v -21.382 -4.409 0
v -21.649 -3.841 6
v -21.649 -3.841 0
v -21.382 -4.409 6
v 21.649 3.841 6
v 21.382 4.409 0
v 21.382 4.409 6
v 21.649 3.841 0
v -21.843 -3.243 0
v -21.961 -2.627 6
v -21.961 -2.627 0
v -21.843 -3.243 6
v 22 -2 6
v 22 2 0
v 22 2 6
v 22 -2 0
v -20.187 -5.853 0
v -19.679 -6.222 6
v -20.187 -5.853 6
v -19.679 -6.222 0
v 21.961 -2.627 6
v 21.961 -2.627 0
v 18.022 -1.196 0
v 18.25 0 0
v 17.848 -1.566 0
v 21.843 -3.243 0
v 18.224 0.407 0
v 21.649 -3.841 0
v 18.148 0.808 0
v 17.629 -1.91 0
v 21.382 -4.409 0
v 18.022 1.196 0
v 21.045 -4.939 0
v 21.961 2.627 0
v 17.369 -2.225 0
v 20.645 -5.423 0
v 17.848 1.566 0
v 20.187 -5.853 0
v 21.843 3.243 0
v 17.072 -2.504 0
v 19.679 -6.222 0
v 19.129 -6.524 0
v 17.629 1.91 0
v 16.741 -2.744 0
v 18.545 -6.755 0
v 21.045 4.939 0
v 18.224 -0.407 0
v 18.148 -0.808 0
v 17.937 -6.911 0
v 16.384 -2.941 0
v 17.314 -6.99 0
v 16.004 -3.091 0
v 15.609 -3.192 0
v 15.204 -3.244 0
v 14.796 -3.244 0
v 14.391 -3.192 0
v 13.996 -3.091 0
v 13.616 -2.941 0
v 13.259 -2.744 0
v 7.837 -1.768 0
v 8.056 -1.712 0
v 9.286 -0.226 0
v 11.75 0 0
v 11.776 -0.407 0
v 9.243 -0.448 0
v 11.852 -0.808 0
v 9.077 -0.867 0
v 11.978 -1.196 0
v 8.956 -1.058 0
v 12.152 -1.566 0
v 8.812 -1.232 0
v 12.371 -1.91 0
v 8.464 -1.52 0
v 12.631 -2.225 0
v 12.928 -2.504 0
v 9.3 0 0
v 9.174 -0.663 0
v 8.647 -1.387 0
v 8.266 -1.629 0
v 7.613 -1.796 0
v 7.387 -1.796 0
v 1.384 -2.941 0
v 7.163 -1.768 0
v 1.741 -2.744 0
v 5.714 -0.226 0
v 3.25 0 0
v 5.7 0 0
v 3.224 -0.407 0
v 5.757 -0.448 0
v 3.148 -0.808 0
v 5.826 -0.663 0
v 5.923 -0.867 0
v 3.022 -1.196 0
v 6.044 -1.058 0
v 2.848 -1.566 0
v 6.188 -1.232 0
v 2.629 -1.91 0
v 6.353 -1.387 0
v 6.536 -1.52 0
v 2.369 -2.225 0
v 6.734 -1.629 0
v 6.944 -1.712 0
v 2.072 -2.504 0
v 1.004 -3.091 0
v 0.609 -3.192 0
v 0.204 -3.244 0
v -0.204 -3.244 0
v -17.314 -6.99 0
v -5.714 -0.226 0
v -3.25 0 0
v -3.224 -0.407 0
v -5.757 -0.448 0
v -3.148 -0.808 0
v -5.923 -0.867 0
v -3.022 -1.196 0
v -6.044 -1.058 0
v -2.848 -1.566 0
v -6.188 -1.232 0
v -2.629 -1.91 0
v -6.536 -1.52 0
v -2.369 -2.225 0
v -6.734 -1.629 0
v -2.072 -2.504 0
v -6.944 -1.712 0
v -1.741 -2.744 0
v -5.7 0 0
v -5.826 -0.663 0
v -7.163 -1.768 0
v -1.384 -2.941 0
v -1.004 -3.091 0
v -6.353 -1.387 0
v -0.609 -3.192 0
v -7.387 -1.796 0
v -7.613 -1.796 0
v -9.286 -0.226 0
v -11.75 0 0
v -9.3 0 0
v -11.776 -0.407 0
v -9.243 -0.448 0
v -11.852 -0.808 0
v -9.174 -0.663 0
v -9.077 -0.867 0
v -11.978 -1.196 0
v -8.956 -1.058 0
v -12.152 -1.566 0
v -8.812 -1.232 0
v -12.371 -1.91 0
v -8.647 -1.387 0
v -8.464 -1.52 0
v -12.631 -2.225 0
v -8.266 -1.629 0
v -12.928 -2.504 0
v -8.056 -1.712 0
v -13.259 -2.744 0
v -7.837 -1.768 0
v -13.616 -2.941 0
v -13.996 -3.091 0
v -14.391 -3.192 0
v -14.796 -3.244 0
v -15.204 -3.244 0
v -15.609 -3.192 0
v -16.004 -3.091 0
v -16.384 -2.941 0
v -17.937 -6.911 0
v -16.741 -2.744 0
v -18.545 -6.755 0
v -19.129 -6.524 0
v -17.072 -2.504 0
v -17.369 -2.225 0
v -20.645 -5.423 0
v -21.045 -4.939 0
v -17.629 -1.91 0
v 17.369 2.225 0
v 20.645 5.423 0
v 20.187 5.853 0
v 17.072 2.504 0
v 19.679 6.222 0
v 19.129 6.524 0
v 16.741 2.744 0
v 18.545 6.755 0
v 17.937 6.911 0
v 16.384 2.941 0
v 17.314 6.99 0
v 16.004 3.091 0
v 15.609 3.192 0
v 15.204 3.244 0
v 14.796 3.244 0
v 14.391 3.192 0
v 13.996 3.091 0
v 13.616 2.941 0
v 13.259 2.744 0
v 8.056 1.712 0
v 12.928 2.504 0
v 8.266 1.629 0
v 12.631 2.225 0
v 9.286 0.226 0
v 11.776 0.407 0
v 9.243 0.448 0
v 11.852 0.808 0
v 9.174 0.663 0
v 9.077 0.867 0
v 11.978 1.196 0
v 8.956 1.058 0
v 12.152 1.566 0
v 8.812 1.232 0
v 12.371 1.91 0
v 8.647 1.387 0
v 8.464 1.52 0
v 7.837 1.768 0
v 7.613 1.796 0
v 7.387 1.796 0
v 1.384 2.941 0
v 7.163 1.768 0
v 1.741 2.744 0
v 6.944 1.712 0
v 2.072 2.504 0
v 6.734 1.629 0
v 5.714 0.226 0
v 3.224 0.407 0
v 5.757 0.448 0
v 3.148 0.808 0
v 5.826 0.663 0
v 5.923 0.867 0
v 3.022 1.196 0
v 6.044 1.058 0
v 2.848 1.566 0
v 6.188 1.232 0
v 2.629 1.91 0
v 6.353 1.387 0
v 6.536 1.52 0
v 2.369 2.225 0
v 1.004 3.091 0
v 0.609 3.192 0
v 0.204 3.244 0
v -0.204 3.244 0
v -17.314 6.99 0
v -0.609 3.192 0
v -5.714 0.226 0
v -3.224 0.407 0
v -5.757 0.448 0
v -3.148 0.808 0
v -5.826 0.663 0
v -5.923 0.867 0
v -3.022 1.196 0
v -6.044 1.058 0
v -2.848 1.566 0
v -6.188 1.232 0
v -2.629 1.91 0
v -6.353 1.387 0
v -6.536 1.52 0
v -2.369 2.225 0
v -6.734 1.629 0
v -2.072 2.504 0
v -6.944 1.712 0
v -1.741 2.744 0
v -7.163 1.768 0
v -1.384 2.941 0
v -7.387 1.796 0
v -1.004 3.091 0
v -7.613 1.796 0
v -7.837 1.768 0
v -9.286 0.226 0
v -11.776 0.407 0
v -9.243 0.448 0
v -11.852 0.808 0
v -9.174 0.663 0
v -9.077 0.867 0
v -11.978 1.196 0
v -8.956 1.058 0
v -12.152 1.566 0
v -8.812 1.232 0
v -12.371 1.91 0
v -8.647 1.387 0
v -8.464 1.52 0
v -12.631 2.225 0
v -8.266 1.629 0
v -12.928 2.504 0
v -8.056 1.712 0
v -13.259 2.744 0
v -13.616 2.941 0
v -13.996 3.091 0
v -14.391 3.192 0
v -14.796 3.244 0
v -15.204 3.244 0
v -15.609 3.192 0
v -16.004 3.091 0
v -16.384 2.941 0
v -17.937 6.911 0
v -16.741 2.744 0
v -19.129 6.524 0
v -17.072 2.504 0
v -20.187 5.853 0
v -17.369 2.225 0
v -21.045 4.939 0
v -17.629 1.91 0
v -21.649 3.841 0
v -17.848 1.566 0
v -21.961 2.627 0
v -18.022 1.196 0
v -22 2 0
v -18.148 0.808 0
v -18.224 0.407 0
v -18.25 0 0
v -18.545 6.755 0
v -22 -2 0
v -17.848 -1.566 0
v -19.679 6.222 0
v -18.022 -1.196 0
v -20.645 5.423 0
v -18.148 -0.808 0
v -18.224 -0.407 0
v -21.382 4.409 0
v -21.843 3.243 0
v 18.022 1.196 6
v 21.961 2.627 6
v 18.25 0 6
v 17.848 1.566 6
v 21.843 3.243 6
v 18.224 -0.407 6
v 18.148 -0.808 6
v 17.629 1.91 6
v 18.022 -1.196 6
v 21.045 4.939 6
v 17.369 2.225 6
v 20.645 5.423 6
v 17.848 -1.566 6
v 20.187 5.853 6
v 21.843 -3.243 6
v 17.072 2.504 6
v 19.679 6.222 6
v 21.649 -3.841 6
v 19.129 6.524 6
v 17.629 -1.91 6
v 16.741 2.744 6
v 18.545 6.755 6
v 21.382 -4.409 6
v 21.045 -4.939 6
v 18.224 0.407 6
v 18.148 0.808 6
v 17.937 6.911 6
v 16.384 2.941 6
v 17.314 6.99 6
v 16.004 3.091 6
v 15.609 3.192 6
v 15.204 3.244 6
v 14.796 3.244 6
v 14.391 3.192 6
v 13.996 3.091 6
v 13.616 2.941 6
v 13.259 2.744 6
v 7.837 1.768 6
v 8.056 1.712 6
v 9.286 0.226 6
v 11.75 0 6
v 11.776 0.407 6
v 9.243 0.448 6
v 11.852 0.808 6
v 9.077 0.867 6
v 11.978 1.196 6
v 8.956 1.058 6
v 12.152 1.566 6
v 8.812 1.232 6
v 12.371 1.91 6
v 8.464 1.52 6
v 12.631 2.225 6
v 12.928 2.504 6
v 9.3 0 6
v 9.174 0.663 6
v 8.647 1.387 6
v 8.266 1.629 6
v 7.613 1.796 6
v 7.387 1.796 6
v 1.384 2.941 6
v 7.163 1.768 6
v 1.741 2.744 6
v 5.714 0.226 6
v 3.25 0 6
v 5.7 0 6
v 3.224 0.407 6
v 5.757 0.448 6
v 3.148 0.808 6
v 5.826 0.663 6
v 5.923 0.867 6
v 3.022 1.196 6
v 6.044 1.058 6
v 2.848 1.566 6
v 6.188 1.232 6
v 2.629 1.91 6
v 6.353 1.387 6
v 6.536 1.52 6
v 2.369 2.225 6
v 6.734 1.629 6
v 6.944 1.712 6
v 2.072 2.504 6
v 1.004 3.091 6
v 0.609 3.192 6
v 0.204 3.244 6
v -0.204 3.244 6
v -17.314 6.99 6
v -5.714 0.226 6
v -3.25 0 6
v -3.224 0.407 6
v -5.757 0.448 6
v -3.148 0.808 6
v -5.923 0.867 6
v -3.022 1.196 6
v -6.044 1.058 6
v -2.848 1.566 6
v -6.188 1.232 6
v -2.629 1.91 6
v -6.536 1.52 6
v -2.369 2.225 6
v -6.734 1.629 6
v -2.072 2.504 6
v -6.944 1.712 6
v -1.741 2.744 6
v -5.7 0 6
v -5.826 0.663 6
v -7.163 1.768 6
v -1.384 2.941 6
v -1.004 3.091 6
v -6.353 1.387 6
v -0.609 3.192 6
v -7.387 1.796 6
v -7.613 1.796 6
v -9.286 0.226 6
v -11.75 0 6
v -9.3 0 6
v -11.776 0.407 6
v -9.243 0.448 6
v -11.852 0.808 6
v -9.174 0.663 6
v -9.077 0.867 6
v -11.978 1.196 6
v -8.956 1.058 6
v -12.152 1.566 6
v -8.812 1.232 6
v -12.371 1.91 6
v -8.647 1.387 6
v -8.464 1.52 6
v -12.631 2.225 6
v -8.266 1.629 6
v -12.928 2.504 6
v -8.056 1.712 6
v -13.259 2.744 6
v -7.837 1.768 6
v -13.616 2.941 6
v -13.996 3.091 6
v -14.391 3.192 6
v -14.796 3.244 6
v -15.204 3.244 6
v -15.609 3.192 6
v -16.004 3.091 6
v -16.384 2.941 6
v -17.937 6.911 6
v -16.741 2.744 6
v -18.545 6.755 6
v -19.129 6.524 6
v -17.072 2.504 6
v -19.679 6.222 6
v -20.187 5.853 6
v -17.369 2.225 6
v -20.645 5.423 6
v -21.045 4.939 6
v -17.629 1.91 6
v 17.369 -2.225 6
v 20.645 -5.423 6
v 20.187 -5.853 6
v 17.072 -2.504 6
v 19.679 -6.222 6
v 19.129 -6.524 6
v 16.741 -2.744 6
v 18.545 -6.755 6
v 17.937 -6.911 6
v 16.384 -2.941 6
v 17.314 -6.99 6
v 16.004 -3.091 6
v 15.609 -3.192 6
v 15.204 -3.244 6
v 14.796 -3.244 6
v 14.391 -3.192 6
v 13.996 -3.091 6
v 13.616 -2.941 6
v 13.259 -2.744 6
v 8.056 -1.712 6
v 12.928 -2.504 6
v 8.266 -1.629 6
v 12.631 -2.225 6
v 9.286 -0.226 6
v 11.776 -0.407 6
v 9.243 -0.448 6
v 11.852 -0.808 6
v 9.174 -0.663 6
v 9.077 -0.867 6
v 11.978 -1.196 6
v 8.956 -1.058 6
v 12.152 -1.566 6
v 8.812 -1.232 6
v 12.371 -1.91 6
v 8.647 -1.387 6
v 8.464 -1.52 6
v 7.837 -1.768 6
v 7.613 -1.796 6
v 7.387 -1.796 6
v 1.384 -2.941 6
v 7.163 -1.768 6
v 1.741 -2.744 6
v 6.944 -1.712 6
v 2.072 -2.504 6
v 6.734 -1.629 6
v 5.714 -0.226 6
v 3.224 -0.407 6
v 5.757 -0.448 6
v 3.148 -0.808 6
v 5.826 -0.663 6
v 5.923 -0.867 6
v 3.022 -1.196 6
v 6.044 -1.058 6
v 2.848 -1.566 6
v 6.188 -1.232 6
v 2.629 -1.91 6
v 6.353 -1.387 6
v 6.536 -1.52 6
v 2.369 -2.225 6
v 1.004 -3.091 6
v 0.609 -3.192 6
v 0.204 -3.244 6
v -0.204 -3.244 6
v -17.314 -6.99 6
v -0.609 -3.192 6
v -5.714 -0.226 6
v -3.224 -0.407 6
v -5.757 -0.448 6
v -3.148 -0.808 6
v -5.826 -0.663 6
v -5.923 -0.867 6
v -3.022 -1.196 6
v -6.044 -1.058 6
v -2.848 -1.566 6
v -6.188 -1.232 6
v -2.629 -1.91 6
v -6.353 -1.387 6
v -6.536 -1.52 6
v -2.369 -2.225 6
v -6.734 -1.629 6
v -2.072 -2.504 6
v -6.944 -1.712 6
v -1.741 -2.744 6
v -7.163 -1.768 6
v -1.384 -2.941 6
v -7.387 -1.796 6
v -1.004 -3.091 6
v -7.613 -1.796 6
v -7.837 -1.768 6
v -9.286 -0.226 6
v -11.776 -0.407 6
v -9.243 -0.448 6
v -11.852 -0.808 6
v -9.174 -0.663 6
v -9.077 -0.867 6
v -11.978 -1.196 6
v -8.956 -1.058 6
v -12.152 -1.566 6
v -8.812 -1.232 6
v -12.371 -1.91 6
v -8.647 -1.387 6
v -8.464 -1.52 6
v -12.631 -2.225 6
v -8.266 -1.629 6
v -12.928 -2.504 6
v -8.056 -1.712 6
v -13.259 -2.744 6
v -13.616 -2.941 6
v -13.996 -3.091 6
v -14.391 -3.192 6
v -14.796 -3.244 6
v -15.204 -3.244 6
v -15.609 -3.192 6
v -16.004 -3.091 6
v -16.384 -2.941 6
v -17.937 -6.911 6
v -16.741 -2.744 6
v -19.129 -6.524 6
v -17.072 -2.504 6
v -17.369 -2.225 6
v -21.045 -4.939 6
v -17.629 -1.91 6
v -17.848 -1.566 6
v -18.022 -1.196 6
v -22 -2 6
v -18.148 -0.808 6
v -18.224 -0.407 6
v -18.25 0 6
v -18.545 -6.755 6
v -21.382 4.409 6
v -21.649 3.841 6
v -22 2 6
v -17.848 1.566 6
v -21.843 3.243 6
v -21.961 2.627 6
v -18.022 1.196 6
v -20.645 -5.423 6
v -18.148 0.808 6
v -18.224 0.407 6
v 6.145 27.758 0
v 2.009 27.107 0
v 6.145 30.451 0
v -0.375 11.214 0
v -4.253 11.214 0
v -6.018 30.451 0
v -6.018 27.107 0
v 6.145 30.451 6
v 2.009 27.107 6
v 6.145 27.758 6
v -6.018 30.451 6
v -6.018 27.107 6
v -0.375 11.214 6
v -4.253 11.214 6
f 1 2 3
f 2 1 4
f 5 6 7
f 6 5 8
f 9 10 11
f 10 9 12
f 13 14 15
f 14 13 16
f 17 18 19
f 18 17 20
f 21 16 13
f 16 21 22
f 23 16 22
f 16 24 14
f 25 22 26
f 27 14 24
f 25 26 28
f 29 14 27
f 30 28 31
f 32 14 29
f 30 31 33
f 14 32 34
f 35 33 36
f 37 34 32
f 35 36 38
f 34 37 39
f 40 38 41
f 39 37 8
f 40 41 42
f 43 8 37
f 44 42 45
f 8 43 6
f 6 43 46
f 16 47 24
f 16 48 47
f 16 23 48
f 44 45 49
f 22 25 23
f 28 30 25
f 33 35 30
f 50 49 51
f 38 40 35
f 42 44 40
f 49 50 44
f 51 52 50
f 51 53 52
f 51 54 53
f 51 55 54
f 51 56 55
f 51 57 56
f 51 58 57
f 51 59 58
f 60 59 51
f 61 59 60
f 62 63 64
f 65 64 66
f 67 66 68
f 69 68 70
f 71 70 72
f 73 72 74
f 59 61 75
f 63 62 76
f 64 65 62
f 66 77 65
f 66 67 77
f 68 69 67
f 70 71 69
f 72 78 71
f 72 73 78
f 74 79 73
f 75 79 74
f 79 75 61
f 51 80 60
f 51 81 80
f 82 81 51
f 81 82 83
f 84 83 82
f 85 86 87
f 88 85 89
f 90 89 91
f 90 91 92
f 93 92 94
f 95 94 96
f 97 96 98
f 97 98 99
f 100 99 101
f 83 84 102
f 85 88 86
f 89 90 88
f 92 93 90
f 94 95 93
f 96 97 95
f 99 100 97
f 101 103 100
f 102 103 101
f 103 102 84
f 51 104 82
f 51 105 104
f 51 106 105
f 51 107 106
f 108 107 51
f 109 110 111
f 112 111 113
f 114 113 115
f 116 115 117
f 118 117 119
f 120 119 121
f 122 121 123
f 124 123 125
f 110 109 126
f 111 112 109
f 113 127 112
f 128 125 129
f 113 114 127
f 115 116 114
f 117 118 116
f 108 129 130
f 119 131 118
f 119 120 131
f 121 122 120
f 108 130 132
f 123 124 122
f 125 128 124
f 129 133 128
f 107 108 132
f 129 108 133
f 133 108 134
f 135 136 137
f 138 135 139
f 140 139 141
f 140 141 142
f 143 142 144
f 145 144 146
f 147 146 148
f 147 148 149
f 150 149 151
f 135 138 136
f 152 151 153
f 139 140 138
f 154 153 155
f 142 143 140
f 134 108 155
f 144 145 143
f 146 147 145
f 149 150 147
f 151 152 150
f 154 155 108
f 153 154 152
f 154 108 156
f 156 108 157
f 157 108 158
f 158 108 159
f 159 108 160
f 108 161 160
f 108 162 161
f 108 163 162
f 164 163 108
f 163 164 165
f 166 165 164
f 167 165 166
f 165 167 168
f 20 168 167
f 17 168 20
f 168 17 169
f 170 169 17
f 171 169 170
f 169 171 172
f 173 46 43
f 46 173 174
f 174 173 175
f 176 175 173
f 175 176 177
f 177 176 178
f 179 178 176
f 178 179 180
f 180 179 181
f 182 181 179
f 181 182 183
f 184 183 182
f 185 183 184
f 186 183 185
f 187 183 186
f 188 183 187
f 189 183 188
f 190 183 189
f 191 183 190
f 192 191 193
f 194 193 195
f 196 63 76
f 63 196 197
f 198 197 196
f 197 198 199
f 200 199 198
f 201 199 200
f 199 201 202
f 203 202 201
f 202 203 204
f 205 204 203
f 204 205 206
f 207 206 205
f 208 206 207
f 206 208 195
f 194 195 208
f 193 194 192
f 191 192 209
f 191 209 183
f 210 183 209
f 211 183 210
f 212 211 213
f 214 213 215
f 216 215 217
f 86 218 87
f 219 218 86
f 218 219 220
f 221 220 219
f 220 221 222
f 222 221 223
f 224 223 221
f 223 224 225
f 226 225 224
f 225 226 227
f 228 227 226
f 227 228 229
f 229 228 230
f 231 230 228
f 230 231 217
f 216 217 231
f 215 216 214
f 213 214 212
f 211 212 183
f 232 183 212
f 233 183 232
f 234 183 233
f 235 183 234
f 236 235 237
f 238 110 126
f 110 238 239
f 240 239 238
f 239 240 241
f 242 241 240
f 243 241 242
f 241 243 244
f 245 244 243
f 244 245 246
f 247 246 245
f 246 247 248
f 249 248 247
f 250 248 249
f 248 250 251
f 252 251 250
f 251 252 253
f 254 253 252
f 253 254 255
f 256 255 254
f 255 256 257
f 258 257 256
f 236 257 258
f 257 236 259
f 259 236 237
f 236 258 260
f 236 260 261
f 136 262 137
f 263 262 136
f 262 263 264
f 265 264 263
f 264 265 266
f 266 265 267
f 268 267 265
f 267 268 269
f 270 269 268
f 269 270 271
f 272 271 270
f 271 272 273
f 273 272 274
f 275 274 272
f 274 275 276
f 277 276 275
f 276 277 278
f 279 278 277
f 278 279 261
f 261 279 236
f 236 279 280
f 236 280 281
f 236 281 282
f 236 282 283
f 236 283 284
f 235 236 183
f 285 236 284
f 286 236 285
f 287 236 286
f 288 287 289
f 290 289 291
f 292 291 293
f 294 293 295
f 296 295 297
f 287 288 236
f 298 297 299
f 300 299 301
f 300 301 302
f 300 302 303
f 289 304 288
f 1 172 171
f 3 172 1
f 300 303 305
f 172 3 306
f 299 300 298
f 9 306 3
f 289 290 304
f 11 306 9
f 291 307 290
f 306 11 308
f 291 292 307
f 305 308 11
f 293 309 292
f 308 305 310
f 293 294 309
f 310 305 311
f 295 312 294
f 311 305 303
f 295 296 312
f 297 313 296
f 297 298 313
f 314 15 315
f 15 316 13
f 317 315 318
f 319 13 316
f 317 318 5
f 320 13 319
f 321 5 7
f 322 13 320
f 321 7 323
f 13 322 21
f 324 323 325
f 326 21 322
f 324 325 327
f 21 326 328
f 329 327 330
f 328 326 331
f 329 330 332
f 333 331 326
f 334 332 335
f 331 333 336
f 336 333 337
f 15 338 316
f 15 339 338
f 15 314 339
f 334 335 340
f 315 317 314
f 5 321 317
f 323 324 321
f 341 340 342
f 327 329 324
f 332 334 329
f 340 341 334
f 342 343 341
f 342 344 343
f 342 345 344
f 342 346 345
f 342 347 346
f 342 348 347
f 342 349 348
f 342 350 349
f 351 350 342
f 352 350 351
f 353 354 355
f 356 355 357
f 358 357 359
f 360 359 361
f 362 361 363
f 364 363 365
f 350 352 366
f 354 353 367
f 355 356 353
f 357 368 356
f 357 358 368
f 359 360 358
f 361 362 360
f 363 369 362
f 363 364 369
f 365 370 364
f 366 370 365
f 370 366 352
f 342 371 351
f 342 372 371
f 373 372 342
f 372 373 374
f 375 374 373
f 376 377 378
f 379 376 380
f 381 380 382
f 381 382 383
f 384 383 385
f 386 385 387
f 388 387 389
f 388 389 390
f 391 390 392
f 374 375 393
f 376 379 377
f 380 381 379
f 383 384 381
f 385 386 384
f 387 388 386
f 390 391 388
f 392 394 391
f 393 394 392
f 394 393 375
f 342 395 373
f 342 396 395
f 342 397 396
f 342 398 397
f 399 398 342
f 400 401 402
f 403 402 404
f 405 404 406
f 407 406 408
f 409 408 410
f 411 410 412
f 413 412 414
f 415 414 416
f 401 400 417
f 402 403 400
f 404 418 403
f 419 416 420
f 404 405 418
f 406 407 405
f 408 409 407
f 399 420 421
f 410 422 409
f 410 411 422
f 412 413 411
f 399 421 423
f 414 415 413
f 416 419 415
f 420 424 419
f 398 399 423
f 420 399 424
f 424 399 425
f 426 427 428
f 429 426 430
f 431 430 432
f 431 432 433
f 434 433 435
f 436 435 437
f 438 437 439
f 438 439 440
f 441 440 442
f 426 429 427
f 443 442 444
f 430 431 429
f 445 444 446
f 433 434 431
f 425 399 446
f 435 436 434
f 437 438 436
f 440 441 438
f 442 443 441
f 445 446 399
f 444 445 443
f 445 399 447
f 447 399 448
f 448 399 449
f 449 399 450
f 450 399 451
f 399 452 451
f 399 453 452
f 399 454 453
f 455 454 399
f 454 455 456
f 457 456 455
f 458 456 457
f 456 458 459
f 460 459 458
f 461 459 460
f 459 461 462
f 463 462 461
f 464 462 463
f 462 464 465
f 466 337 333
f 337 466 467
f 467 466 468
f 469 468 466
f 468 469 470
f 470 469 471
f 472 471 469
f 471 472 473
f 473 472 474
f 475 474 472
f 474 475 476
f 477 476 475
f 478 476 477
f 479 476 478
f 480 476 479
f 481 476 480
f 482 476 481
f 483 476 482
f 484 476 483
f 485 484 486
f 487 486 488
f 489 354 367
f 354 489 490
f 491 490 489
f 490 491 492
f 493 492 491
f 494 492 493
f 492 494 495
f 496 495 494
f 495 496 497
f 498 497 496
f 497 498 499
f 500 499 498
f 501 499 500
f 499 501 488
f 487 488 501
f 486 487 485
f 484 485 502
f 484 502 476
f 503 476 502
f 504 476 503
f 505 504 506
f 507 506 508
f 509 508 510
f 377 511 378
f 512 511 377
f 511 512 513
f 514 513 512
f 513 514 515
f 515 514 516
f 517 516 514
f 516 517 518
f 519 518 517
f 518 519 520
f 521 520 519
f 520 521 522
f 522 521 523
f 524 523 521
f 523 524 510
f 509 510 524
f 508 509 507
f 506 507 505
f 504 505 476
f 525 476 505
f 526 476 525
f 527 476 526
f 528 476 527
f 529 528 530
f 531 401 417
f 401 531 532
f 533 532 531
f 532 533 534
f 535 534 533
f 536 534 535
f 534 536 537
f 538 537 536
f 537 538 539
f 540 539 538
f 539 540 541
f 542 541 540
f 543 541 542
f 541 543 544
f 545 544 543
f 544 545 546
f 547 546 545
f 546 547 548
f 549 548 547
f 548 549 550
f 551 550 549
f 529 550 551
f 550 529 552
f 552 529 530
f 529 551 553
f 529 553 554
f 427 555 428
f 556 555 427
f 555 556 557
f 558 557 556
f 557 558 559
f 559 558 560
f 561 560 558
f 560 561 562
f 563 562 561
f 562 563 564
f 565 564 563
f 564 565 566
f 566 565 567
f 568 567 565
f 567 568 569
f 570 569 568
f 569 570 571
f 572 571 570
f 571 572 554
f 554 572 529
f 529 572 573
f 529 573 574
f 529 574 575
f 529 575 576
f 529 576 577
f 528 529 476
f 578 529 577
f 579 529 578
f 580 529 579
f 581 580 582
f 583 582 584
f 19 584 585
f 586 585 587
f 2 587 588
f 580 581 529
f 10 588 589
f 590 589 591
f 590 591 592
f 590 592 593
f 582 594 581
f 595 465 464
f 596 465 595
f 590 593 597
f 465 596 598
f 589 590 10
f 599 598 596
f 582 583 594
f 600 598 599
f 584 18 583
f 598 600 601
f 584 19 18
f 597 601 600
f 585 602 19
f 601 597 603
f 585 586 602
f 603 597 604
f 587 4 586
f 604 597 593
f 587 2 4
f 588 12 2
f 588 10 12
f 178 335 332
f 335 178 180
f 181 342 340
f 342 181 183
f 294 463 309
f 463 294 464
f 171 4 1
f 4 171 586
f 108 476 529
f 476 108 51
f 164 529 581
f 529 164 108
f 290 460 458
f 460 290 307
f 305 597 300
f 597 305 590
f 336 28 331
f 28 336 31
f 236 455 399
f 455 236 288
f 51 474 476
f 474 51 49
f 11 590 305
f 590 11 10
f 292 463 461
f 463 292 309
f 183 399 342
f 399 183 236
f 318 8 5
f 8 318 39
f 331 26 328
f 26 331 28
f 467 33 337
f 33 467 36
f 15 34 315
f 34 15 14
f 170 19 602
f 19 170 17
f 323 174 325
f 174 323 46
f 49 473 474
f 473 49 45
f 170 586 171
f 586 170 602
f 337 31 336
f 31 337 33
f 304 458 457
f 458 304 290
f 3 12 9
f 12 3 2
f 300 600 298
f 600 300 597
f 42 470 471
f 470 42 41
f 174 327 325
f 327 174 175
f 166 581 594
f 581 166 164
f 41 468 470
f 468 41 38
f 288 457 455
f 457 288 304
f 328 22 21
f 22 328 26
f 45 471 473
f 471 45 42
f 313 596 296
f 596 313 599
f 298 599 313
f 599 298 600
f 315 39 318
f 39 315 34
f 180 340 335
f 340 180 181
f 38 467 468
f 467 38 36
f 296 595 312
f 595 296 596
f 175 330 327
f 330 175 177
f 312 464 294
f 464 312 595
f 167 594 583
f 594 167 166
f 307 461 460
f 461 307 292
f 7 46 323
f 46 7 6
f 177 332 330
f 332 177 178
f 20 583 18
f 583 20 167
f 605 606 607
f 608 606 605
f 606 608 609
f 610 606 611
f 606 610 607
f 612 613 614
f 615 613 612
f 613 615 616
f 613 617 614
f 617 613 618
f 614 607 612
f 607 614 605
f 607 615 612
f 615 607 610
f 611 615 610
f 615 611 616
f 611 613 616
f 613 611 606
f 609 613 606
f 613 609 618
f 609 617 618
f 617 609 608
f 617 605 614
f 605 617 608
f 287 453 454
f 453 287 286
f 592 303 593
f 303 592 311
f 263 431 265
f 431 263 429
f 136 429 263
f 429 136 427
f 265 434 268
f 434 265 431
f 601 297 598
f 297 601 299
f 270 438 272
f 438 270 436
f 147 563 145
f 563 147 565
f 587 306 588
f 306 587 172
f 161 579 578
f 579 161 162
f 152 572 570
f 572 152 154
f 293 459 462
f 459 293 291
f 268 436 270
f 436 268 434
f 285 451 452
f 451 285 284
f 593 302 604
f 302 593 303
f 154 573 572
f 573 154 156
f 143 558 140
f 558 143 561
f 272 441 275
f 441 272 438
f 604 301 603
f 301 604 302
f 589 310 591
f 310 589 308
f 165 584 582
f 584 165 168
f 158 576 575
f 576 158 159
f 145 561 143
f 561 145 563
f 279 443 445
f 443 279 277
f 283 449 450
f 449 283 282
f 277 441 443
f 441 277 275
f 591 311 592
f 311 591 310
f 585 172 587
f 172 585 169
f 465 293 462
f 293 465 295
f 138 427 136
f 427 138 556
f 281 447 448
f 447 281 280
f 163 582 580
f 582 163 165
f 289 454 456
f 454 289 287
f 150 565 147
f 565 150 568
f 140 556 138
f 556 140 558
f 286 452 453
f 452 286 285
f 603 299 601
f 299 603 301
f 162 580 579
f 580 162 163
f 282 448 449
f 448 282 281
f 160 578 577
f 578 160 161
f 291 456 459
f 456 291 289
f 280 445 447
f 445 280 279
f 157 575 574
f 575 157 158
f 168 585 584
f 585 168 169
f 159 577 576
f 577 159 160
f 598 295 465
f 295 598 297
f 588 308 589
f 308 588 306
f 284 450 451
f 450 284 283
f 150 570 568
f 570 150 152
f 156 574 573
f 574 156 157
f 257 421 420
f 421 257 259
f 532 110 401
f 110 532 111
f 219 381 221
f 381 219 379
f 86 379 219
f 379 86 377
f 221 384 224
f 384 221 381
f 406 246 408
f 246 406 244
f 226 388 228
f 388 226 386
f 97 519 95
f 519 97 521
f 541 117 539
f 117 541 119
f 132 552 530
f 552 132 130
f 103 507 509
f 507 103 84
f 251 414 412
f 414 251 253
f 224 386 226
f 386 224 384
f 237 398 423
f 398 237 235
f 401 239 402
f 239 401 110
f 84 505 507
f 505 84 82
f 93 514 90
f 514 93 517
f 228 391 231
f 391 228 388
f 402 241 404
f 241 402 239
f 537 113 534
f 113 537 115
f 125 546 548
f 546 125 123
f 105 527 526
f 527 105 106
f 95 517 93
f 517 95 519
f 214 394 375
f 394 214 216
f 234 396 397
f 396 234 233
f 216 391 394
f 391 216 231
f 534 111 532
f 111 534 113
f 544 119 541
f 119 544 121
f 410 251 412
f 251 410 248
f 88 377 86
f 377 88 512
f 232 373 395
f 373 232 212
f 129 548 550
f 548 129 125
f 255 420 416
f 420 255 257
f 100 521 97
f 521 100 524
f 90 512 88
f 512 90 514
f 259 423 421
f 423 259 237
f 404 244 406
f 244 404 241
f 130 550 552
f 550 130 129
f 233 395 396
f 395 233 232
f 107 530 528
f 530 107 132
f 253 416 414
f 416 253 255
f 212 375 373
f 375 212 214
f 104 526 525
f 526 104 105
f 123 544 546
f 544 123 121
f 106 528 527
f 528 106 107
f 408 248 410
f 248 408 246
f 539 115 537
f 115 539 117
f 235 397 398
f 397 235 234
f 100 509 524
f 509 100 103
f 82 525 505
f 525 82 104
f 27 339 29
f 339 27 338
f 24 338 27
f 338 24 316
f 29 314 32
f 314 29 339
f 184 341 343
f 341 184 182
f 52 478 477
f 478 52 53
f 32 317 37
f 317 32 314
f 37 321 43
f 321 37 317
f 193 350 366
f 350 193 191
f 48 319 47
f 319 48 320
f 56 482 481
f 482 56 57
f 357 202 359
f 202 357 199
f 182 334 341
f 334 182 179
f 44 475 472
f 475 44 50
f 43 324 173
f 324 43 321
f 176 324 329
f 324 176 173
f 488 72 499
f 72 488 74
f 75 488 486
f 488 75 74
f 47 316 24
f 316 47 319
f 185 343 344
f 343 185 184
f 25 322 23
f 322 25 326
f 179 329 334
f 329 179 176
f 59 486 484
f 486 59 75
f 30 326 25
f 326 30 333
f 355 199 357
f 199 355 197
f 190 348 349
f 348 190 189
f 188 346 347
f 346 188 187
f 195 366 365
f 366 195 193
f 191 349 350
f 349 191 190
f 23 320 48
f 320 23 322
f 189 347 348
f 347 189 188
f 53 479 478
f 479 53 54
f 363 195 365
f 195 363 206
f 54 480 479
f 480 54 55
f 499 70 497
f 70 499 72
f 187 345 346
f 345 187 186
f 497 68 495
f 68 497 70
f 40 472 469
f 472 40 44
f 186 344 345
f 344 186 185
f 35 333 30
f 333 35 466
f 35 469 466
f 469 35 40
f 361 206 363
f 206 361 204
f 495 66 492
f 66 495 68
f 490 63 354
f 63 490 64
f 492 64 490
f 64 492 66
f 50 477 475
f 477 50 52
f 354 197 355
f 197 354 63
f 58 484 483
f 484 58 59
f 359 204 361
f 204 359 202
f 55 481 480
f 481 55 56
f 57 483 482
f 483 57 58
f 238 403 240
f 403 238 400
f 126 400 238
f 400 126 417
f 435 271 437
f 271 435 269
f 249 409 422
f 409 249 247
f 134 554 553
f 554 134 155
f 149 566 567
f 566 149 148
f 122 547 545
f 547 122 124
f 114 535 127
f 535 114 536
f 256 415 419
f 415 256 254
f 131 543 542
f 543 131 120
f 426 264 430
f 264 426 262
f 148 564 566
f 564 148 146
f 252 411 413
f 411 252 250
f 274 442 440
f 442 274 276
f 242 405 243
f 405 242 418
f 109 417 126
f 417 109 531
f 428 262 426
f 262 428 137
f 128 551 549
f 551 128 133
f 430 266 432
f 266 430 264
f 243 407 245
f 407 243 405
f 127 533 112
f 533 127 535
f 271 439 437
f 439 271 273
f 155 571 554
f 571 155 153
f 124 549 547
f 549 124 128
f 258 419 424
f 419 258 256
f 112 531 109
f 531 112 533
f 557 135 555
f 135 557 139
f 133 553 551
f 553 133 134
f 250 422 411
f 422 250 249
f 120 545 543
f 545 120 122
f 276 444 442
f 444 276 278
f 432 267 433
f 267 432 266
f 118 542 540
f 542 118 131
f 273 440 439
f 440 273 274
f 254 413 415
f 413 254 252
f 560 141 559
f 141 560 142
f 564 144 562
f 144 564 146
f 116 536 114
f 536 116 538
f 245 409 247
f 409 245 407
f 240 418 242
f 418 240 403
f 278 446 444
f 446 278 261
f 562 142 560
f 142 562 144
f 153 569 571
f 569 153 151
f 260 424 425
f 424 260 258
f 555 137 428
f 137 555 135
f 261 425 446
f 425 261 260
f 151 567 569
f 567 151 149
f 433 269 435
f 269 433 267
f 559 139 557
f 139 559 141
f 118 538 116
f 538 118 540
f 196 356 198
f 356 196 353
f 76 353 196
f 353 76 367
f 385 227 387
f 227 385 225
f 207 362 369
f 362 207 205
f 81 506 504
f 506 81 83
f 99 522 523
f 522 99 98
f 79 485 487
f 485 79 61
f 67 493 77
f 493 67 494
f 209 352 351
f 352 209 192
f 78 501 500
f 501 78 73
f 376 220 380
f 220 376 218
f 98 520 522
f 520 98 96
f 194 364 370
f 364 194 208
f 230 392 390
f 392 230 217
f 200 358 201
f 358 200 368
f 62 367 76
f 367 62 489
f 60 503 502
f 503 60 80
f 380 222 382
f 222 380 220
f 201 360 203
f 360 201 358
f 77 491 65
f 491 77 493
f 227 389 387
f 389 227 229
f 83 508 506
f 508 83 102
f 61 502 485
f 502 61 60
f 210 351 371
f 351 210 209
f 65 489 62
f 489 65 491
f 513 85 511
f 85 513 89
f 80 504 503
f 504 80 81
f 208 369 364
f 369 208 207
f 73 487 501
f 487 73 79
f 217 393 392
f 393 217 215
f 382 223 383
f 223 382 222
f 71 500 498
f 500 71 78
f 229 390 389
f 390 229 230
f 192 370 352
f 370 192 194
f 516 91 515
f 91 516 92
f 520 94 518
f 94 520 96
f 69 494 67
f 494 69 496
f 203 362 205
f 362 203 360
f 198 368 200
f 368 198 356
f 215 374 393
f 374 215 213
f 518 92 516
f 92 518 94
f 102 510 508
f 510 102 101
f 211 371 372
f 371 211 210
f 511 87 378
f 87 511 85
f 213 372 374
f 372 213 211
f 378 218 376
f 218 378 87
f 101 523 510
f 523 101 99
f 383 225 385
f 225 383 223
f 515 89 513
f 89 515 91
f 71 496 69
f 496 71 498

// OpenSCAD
$fn = 50;


difference() {
	union() {
		hull() {
			translate(v = [-17.0000000000, 2.0000000000, 0]) {
				cylinder(h = 6, r = 5);
			}
			translate(v = [17.0000000000, 2.0000000000, 0]) {
				cylinder(h = 6, r = 5);
			}
			translate(v = [-17.0000000000, -2.0000000000, 0]) {
				cylinder(h = 6, r = 5);
			}
			translate(v = [17.0000000000, -2.0000000000, 0]) {
				cylinder(h = 6, r = 5);
			}
		}
		translate(v = [0, 30.0000000000, 0]) {
			linear_extrude(height = 6) {
				text(font = "DejaVu Sans Mono:style=Bold", halign = "center", size = 19.0000000000, text = "7", valign = "top");
			}
		}
	}
	union() {
		translate(v = [-15.0000000000, 0.0000000000, 0]) {
			translate(v = [0, 0, -100]) {
				cylinder(h = 200, r = 3.2500000000);
			}
		}
		translate(v = [0, 0, -100]) {
			cylinder(h = 200, r = 3.2500000000);
		}
		translate(v = [15.0000000000, 0.0000000000, 0]) {
			translate(v = [0, 0, -100]) {
				cylinder(h = 200, r = 3.2500000000);
			}
		}
		translate(v = [-15.0000000000, 0.0000000000, 0]) {
			translate(v = [0, 0, -100]) {
				cylinder(h = 200, r = 1.8000000000);
			}
		}
		translate(v = [-7.5000000000, 0.0000000000, 0]) {
			translate(v = [0, 0, -100]) {
				cylinder(h = 200, r = 1.8000000000);
			}
		}
		translate(v = [0, 0, -100]) {
			cylinder(h = 200, r = 1.8000000000);
		}
		translate(v = [7.5000000000, 0.0000000000, 0]) {
			translate(v = [0, 0, -100]) {
				cylinder(h = 200, r = 1.8000000000);
			}
		}
		translate(v = [15.0000000000, 0.0000000000, 0]) {
			translate(v = [0, 0, -100]) {
				cylinder(h = 200, r = 1.8000000000);
			}
		}
	}
}
